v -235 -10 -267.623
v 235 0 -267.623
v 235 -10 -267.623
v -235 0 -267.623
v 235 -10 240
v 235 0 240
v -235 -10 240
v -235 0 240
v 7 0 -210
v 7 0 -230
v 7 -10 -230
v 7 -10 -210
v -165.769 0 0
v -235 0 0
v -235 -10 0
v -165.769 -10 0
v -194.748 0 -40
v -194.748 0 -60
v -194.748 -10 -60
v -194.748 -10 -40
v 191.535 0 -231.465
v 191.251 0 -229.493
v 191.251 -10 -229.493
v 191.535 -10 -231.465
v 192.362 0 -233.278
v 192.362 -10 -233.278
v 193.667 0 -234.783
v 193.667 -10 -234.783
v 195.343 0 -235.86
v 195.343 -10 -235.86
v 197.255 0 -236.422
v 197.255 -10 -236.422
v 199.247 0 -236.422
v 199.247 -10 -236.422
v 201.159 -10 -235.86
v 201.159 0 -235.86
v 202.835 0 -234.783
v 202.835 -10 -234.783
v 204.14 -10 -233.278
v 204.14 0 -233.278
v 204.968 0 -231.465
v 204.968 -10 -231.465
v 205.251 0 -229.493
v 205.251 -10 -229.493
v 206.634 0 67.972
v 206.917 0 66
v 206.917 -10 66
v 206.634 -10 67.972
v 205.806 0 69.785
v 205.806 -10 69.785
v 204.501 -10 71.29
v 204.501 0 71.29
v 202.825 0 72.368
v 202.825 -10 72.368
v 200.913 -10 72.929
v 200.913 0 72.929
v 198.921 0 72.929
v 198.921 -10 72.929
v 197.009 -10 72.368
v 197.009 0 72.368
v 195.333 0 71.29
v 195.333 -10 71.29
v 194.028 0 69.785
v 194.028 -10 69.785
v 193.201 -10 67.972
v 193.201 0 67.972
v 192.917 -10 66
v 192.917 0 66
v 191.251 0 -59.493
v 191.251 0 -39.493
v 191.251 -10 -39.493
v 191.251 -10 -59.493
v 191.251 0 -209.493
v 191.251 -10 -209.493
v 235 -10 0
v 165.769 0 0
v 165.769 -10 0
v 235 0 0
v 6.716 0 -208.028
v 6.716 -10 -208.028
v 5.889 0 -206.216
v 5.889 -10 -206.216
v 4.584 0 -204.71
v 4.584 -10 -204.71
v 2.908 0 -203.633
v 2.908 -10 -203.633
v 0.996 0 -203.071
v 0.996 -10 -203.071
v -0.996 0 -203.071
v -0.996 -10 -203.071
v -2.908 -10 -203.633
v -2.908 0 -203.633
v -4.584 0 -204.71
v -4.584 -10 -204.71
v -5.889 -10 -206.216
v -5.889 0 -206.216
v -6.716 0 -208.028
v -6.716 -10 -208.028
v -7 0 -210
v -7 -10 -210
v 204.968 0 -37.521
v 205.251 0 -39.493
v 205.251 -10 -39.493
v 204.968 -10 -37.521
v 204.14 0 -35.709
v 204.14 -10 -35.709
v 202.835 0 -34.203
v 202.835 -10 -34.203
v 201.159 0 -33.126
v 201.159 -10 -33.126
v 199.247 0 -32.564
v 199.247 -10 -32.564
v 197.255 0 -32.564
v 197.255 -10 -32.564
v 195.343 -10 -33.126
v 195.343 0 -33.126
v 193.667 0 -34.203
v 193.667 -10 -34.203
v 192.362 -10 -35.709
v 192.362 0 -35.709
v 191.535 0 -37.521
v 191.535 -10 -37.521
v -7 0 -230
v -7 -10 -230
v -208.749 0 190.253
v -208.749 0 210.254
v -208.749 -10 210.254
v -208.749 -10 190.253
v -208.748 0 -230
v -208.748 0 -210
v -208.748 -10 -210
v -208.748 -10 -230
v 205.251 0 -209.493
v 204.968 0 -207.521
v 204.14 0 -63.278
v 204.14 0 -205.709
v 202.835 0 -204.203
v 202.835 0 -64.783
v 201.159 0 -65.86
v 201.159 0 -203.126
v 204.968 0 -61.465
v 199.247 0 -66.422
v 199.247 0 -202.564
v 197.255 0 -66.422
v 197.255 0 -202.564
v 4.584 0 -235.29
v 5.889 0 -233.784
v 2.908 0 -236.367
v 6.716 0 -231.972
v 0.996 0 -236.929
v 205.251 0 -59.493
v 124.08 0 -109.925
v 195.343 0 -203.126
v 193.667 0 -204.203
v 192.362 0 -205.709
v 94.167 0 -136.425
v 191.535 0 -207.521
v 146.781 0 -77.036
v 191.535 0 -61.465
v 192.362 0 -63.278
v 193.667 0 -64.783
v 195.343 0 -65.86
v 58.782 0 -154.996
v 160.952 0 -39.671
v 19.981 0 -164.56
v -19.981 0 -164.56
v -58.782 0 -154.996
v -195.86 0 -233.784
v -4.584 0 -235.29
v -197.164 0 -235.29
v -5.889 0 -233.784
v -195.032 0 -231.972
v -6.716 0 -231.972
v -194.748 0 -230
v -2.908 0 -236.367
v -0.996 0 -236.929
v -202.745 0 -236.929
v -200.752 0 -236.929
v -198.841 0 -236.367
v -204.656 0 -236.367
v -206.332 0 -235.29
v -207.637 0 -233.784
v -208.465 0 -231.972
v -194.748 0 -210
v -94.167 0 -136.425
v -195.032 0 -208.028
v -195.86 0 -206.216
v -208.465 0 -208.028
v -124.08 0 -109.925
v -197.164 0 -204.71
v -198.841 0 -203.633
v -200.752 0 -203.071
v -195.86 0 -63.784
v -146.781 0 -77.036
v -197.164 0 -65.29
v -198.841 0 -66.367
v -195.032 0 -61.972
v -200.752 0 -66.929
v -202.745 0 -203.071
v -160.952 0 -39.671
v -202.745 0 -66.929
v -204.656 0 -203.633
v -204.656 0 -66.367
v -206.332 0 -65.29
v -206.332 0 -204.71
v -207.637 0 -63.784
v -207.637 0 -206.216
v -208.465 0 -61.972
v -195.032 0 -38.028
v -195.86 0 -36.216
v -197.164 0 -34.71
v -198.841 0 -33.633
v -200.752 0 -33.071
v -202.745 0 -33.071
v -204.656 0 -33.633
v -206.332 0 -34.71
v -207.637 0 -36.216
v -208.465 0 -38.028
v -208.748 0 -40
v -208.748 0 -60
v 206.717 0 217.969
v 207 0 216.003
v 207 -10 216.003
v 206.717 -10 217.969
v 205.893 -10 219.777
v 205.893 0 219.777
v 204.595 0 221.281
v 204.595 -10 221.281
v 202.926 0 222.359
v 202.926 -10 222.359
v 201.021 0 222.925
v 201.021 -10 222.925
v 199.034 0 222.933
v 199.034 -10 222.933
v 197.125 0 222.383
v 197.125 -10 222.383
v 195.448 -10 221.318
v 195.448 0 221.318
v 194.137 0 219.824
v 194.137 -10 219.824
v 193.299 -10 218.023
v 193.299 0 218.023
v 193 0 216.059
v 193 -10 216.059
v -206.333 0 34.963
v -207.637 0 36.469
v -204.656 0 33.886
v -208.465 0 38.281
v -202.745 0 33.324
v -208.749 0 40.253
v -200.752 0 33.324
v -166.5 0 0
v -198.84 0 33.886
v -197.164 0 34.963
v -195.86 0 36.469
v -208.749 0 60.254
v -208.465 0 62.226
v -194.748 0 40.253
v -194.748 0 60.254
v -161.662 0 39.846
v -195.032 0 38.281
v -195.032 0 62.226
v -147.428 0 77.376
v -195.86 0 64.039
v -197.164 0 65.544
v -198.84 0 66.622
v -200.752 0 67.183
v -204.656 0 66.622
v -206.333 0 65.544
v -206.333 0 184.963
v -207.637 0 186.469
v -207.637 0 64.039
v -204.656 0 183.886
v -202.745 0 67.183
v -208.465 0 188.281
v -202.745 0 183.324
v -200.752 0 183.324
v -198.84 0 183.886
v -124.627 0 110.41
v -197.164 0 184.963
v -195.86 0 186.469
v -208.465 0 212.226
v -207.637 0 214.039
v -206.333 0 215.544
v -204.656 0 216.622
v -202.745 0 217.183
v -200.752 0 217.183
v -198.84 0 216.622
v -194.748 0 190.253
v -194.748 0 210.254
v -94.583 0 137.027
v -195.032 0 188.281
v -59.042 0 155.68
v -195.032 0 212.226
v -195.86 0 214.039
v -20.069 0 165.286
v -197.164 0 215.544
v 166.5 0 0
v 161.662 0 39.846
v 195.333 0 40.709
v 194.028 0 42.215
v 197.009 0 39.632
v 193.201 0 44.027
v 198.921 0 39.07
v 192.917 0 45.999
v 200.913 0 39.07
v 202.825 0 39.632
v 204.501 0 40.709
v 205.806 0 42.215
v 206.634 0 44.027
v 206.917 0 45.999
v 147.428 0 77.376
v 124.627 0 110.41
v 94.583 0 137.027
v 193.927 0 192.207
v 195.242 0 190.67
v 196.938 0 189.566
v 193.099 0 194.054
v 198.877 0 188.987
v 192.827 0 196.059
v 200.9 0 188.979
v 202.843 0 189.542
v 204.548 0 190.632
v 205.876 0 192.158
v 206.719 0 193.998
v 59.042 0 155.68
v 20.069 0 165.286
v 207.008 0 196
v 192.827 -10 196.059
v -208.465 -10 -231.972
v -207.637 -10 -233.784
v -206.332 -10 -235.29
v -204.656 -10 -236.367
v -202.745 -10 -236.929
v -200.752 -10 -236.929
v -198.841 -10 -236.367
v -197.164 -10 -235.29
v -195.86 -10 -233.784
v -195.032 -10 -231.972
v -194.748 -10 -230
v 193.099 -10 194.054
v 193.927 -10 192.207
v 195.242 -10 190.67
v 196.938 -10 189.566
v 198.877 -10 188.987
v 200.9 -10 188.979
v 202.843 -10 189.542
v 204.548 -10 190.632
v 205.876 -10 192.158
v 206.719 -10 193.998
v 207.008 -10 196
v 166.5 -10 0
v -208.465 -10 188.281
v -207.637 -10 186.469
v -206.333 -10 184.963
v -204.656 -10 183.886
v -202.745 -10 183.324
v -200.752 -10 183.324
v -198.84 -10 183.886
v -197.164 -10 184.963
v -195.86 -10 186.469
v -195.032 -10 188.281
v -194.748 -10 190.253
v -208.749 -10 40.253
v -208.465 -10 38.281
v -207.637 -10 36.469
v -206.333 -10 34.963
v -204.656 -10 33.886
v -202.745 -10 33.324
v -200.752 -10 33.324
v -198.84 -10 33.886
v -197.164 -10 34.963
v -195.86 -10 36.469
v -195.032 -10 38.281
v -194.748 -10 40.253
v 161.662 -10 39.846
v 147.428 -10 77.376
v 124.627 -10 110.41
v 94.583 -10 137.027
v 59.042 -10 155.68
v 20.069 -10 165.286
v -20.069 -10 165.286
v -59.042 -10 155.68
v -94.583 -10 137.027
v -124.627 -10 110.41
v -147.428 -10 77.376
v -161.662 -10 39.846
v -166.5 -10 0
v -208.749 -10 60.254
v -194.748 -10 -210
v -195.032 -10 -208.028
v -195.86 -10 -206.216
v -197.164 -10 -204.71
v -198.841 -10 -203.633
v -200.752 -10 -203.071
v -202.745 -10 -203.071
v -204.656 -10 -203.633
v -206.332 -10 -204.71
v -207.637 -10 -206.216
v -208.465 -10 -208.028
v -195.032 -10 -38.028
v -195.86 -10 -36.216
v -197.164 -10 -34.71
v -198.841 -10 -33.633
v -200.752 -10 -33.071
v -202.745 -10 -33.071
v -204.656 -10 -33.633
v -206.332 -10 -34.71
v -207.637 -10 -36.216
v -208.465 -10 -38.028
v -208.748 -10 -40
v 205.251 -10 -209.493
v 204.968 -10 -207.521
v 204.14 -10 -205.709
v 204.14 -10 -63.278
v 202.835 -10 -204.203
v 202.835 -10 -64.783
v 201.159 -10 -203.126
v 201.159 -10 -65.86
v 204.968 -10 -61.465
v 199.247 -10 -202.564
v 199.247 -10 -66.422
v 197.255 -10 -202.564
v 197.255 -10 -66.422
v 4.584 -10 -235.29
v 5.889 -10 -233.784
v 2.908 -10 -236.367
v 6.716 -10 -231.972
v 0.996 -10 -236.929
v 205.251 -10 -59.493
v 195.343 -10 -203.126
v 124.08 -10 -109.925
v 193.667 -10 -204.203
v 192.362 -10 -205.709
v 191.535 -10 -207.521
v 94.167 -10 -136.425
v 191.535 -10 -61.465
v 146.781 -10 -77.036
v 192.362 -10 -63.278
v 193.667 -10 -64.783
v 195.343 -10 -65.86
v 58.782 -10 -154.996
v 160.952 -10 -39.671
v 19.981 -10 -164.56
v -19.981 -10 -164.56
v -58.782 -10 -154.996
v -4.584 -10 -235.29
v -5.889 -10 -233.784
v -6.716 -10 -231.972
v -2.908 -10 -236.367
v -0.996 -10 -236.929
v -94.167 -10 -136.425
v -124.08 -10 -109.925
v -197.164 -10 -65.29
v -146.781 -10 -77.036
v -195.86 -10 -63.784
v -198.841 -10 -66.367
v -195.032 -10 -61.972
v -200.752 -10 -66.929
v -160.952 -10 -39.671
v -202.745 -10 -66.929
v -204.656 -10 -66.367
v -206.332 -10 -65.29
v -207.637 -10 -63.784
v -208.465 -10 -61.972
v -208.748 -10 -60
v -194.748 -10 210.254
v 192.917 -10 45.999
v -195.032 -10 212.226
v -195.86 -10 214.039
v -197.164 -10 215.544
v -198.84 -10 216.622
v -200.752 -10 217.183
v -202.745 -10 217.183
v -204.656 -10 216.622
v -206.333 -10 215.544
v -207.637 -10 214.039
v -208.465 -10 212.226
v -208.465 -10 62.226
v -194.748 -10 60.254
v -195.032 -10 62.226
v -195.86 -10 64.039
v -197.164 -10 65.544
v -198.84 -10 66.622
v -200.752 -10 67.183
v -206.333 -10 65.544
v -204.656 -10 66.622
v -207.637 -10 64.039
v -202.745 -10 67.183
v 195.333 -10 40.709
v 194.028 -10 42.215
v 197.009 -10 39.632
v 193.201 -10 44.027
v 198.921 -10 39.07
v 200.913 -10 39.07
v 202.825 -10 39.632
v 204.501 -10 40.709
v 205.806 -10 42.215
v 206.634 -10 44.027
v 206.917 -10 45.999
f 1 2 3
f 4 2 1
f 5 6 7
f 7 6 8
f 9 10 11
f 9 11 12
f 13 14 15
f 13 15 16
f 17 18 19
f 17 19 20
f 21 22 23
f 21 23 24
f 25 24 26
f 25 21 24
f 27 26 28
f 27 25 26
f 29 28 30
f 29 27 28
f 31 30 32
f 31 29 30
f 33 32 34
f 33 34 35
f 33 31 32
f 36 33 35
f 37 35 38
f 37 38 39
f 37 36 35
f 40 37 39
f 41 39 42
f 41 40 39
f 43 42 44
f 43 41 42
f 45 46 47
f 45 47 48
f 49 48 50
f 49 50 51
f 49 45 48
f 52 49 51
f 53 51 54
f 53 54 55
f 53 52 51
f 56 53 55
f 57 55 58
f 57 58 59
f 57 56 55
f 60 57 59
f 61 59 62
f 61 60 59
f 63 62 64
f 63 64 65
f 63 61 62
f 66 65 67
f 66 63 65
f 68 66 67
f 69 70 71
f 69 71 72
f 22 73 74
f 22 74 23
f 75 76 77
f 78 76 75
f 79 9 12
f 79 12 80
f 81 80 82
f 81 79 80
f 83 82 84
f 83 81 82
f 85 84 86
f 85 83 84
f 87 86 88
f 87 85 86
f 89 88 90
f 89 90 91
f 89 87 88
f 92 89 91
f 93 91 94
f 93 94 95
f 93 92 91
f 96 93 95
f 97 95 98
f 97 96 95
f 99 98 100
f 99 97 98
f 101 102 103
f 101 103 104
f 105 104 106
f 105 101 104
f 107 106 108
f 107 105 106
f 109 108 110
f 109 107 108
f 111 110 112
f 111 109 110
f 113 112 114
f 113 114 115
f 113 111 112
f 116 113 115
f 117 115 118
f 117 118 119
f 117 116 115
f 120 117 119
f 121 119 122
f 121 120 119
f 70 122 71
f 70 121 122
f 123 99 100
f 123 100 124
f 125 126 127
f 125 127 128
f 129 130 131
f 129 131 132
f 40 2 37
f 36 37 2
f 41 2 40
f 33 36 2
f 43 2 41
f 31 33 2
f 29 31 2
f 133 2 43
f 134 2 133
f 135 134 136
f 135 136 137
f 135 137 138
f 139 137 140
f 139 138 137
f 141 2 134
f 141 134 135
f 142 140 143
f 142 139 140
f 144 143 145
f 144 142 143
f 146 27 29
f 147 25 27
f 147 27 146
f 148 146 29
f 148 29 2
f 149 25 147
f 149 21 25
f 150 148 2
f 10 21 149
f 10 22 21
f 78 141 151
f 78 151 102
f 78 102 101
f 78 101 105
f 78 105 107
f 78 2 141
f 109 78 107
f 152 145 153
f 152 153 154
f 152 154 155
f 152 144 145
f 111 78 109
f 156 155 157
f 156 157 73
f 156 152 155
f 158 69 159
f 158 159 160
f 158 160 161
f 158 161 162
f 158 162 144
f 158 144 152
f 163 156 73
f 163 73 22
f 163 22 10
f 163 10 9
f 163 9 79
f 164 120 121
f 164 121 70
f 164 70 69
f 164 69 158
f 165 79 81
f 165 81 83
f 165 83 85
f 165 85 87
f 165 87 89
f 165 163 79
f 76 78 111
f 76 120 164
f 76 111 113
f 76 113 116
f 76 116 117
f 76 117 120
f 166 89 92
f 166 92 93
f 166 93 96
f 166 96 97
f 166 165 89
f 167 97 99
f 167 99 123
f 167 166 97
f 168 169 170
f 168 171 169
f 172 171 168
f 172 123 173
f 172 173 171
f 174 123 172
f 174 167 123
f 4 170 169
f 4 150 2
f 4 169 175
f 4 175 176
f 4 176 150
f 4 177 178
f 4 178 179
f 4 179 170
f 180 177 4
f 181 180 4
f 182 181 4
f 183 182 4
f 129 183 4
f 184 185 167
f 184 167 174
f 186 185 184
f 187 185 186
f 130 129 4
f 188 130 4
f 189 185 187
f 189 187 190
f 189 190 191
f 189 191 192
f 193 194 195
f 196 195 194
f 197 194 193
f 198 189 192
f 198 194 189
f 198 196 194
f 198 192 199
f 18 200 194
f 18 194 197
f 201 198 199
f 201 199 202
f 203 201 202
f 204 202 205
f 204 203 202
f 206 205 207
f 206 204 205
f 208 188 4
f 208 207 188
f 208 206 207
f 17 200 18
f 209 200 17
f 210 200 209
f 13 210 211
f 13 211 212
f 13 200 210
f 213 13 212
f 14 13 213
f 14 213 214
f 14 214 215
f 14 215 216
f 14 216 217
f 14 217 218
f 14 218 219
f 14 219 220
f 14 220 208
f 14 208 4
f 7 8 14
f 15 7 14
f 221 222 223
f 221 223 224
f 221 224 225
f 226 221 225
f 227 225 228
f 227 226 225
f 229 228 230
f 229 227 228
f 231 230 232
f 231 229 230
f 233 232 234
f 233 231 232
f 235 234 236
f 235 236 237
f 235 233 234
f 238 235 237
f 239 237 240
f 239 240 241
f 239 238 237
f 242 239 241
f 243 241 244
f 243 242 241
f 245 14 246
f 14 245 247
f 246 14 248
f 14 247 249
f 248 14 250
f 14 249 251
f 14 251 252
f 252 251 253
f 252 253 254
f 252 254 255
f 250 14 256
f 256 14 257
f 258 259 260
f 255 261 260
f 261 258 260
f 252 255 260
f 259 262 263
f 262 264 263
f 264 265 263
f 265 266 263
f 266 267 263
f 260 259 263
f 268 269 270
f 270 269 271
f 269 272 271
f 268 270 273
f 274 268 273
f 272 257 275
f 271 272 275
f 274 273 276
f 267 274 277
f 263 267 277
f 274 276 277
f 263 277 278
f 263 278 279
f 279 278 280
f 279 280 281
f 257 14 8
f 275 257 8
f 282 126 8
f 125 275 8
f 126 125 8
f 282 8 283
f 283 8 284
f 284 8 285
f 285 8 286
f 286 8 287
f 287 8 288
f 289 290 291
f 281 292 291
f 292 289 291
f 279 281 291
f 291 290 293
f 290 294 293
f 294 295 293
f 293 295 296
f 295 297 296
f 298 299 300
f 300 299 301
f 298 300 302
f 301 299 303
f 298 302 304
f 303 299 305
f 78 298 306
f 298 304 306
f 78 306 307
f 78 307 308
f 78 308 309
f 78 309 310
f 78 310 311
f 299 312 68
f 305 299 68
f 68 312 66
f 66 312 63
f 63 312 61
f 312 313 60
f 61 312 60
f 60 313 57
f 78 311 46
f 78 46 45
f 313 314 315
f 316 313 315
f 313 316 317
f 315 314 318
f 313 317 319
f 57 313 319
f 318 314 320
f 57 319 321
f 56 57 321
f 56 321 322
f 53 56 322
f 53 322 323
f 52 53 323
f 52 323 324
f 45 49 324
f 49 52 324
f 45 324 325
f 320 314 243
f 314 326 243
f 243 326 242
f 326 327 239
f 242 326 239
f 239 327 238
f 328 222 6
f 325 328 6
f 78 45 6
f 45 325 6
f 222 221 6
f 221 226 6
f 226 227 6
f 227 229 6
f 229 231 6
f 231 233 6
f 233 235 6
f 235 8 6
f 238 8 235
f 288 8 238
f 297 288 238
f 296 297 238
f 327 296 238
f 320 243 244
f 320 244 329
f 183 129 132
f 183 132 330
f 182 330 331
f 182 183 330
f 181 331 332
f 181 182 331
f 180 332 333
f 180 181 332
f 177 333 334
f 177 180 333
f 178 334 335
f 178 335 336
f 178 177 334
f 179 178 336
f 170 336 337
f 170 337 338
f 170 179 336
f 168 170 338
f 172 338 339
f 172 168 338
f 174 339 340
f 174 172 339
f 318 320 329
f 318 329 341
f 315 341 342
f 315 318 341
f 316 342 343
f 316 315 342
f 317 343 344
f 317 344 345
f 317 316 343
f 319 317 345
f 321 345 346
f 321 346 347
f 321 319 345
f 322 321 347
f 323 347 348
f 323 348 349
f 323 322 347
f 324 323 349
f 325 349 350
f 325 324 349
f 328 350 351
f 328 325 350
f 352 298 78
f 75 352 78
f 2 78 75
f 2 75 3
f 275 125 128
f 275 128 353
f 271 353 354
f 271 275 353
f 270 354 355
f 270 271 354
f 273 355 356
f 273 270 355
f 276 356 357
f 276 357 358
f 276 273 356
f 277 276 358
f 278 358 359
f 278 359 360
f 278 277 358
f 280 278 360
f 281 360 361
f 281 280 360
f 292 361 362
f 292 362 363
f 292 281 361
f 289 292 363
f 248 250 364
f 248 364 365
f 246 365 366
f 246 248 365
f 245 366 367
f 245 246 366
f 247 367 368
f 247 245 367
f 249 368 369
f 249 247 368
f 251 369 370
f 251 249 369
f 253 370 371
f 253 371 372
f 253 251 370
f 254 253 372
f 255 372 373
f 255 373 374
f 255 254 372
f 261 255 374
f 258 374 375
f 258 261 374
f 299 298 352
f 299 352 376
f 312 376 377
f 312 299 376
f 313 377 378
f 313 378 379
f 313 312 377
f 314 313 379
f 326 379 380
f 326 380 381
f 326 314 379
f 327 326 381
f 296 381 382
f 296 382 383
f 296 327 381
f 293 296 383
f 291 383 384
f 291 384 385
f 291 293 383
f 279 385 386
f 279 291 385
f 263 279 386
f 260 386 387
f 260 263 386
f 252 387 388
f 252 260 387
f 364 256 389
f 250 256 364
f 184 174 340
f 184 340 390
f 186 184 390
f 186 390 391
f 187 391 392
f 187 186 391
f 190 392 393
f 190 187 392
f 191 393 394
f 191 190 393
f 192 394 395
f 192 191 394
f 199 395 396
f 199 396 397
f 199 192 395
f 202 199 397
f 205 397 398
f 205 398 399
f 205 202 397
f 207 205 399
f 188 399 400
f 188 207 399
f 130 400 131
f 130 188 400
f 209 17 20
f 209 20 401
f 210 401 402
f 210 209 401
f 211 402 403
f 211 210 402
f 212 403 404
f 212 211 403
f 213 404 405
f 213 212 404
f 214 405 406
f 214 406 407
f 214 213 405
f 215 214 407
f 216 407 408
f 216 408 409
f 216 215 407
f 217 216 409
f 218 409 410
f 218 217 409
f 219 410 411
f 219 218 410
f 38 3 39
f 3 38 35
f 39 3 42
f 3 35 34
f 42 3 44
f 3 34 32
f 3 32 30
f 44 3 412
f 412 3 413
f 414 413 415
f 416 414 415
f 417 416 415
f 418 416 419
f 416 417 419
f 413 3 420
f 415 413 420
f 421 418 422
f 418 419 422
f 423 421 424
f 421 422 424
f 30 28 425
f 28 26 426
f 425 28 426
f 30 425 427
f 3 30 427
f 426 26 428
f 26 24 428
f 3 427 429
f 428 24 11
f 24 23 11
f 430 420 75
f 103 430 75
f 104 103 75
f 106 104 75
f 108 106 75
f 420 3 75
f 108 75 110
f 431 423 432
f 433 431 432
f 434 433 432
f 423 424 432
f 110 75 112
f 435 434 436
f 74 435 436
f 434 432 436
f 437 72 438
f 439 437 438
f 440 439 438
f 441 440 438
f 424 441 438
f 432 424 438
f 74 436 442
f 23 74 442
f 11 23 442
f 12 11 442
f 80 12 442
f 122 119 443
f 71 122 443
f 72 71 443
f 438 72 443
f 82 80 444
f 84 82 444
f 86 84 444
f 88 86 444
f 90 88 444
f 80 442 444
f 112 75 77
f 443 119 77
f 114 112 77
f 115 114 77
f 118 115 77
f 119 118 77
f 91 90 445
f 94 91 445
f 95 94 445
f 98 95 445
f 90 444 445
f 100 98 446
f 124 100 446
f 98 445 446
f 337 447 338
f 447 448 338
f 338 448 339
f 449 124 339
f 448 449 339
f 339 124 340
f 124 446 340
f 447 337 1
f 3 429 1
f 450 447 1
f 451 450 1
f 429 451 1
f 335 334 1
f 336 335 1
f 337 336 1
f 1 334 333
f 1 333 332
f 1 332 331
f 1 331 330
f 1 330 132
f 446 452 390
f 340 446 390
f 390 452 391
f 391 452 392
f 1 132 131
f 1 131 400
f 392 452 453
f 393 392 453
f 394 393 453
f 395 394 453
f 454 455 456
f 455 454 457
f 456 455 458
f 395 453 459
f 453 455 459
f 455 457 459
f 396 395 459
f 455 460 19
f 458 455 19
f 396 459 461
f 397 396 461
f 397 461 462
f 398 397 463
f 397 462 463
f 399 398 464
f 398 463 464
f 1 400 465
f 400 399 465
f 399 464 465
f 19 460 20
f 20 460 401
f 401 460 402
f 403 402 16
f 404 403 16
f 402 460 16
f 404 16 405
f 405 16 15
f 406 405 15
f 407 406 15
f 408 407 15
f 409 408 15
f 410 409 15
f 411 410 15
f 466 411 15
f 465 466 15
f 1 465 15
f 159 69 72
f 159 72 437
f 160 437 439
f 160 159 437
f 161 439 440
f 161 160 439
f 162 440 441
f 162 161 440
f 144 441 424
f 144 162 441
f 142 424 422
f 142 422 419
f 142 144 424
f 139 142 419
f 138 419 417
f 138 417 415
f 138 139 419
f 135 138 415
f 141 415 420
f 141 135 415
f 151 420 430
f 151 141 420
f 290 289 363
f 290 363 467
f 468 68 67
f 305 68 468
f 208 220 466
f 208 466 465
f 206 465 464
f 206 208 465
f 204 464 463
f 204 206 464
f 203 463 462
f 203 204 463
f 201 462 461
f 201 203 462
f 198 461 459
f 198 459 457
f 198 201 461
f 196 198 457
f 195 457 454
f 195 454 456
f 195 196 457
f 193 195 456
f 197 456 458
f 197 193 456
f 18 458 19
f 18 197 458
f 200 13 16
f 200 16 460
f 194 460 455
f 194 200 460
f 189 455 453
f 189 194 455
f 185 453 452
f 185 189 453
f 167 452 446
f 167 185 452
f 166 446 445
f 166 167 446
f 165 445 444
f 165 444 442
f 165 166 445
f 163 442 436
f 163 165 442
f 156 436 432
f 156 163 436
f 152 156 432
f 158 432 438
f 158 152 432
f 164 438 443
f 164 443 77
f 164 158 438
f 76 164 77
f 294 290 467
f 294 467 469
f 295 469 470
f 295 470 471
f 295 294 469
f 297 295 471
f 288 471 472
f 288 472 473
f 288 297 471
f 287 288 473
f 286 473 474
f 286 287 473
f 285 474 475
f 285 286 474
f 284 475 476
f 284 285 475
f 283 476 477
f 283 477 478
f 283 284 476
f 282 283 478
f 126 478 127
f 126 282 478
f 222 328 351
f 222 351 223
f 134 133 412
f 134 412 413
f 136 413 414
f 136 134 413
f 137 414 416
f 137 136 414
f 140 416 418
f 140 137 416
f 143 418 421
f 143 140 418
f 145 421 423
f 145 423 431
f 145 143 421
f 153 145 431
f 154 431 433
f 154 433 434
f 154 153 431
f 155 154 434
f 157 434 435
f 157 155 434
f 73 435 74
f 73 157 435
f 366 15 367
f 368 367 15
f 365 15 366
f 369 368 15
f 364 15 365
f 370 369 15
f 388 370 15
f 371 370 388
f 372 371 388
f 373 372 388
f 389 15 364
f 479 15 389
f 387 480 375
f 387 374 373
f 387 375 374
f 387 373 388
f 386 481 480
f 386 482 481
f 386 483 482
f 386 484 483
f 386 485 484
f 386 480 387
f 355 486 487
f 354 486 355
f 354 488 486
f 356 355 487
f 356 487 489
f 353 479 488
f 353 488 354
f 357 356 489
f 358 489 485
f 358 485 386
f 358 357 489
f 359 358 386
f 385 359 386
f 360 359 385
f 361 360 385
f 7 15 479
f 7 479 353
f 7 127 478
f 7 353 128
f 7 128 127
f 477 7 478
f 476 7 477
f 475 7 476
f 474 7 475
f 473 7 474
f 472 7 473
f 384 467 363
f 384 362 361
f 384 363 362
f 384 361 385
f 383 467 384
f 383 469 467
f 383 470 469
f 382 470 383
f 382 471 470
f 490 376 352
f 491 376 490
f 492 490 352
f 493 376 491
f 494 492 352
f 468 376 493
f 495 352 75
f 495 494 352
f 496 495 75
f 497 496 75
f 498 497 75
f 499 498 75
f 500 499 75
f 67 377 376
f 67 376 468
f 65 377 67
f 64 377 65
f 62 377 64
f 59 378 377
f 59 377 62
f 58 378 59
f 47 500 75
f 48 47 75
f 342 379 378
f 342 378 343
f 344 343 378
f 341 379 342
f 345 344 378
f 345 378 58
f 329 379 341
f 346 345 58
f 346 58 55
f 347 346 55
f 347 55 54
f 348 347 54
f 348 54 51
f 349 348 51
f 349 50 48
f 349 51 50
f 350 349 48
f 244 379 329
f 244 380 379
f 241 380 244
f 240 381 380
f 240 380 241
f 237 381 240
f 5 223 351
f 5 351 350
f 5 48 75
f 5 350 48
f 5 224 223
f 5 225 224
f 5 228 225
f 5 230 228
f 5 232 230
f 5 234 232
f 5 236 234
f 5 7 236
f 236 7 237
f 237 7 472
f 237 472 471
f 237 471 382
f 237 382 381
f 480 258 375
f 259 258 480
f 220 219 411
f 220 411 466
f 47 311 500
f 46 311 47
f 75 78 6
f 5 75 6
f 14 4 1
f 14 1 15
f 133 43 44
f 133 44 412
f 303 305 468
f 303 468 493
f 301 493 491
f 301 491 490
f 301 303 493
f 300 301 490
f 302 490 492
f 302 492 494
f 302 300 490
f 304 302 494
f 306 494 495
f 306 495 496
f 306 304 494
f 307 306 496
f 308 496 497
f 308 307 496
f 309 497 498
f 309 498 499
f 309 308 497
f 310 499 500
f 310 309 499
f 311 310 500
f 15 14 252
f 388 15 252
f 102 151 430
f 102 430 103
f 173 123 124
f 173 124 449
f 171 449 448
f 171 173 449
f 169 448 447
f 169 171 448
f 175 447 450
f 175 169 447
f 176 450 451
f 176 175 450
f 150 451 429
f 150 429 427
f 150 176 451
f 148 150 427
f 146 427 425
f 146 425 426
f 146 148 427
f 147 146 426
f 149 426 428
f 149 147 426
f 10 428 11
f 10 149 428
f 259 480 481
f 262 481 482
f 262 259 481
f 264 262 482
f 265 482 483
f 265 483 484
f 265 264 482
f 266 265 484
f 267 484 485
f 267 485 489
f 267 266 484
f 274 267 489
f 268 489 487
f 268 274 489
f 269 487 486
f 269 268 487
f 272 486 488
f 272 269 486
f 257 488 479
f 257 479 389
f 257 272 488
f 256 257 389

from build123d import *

# Parameters (mm, degrees)
EXTRUDE_DEPTH    = 10
EXTRUDE001_DEPTH = 10


with BuildPart() as extrude_body:
    # Sketch → Extrude (new body)
    with BuildSketch(Plane.XZ):
        with BuildLine():
            Line((-235, 0), (-166.5, 0))
            ThreePointArc((166.5, 0), (0, 166.5), (-166.5, 0))
            Line((166.5, 0), (235, 0))
            Line((235, 0), (235, 240))
            Line((235, 240), (-235, 240))
            Line((-235, 240), (-235, 0))
        make_face()
        with BuildLine():
            ThreePointArc((207.000122, 216.002623), (200.027945, 223.000067), (193.000122, 216.058513))
            Line((193.000122, 216.058513), (192.826997, 196.058513))
            ThreePointArc((192.826997, 196.058513), (199.888127, 188.910344), (207.007617, 196.000391))
            Line((207.007617, 196.000391), (207.000122, 216.002623))
        make_face(mode=Mode.SUBTRACT)
        with BuildLine():
            ThreePointArc((206.917312, 66), (199.917189, 73.000123), (192.917067, 66))
            Line((192.917067, 66), (192.917067, 45.999251))
            ThreePointArc((192.917067, 45.999251), (199.917189, 38.999128), (206.917312, 45.999251))
            Line((206.917312, 45.999251), (206.917312, 66))
        make_face(mode=Mode.SUBTRACT)
        with BuildLine():
            ThreePointArc((-194.74829, 210.253966), (-201.748413, 217.254089), (-208.748535, 210.253966))
            Line((-208.748535, 210.253966), (-208.748535, 190.253217))
            ThreePointArc((-208.748535, 190.253217), (-201.748413, 183.253095), (-194.74829, 190.253217))
            Line((-194.74829, 190.253217), (-194.74829, 210.253966))
        make_face(mode=Mode.SUBTRACT)
        with BuildLine():
            ThreePointArc((-194.74829, 60.253966), (-201.748413, 67.254089), (-208.748535, 60.253966))
            Line((-208.748535, 60.253966), (-208.748535, 40.253217))
            ThreePointArc((-208.748535, 40.253217), (-201.748413, 33.253095), (-194.74829, 40.253217))
            Line((-194.74829, 40.253217), (-194.74829, 60.253966))
        make_face(mode=Mode.SUBTRACT)
    extrude(amount=EXTRUDE_DEPTH)


with BuildPart() as extrude001:
    # Sketch001 → Extrude001 (new body)
    with BuildSketch(Plane.XZ):
        with BuildLine():
            Line((-235, 0), (-165.768562, 0))
            ThreePointArc((-165.768562, 0), (0, -165.768562), (165.768562, 0))
            Line((165.768562, 0), (235, 0))
            Line((235, 0), (235, -267.622833))
            Line((235, -267.622833), (-235, -267.622833))
            Line((-235, -267.622833), (-235, 0))
        make_face()
        with BuildLine():
            ThreePointArc((-194.748413, -40), (-201.748413, -33), (-208.748413, -40))
            Line((-208.748413, -40), (-208.748413, -60))
            ThreePointArc((-208.748413, -60), (-201.748413, -67), (-194.748413, -60))
            Line((-194.748413, -60), (-194.748413, -40))
        make_face(mode=Mode.SUBTRACT)
        with BuildLine():
            ThreePointArc((-194.748413, -210), (-201.748413, -203), (-208.748413, -210))
            Line((-208.748413, -210), (-208.748413, -230))
            ThreePointArc((-208.748413, -230), (-201.748413, -237), (-194.748413, -230))
            Line((-194.748413, -230), (-194.748413, -210))
        make_face(mode=Mode.SUBTRACT)
        with BuildLine():
            ThreePointArc((205.251266, -39.49302), (198.251266, -32.49302), (191.251266, -39.49302))
            Line((191.251266, -39.49302), (191.251266, -59.49302))
            ThreePointArc((191.251266, -59.49302), (198.251266, -66.49302), (205.251266, -59.49302))
            Line((205.251266, -59.49302), (205.251266, -39.49302))
        make_face(mode=Mode.SUBTRACT)
        with BuildLine():
            ThreePointArc((205.251266, -209.49302), (198.251266, -202.49302), (191.251266, -209.49302))
            Line((191.251266, -209.49302), (191.251266, -229.49302))
            ThreePointArc((191.251266, -229.49302), (198.251266, -236.49302), (205.251266, -229.49302))
            Line((205.251266, -229.49302), (205.251266, -209.49302))
        make_face(mode=Mode.SUBTRACT)
        with BuildLine():
            ThreePointArc((7, -210), (0, -203), (-7, -210))
            Line((-7, -210), (-7, -230))
            ThreePointArc((-7, -230), (0, -237), (7, -230))
            Line((7, -230), (7, -210))
        make_face(mode=Mode.SUBTRACT)
    extrude(amount=EXTRUDE001_DEPTH)


solid = Compound([extrude_body.part, extrude001.part])
